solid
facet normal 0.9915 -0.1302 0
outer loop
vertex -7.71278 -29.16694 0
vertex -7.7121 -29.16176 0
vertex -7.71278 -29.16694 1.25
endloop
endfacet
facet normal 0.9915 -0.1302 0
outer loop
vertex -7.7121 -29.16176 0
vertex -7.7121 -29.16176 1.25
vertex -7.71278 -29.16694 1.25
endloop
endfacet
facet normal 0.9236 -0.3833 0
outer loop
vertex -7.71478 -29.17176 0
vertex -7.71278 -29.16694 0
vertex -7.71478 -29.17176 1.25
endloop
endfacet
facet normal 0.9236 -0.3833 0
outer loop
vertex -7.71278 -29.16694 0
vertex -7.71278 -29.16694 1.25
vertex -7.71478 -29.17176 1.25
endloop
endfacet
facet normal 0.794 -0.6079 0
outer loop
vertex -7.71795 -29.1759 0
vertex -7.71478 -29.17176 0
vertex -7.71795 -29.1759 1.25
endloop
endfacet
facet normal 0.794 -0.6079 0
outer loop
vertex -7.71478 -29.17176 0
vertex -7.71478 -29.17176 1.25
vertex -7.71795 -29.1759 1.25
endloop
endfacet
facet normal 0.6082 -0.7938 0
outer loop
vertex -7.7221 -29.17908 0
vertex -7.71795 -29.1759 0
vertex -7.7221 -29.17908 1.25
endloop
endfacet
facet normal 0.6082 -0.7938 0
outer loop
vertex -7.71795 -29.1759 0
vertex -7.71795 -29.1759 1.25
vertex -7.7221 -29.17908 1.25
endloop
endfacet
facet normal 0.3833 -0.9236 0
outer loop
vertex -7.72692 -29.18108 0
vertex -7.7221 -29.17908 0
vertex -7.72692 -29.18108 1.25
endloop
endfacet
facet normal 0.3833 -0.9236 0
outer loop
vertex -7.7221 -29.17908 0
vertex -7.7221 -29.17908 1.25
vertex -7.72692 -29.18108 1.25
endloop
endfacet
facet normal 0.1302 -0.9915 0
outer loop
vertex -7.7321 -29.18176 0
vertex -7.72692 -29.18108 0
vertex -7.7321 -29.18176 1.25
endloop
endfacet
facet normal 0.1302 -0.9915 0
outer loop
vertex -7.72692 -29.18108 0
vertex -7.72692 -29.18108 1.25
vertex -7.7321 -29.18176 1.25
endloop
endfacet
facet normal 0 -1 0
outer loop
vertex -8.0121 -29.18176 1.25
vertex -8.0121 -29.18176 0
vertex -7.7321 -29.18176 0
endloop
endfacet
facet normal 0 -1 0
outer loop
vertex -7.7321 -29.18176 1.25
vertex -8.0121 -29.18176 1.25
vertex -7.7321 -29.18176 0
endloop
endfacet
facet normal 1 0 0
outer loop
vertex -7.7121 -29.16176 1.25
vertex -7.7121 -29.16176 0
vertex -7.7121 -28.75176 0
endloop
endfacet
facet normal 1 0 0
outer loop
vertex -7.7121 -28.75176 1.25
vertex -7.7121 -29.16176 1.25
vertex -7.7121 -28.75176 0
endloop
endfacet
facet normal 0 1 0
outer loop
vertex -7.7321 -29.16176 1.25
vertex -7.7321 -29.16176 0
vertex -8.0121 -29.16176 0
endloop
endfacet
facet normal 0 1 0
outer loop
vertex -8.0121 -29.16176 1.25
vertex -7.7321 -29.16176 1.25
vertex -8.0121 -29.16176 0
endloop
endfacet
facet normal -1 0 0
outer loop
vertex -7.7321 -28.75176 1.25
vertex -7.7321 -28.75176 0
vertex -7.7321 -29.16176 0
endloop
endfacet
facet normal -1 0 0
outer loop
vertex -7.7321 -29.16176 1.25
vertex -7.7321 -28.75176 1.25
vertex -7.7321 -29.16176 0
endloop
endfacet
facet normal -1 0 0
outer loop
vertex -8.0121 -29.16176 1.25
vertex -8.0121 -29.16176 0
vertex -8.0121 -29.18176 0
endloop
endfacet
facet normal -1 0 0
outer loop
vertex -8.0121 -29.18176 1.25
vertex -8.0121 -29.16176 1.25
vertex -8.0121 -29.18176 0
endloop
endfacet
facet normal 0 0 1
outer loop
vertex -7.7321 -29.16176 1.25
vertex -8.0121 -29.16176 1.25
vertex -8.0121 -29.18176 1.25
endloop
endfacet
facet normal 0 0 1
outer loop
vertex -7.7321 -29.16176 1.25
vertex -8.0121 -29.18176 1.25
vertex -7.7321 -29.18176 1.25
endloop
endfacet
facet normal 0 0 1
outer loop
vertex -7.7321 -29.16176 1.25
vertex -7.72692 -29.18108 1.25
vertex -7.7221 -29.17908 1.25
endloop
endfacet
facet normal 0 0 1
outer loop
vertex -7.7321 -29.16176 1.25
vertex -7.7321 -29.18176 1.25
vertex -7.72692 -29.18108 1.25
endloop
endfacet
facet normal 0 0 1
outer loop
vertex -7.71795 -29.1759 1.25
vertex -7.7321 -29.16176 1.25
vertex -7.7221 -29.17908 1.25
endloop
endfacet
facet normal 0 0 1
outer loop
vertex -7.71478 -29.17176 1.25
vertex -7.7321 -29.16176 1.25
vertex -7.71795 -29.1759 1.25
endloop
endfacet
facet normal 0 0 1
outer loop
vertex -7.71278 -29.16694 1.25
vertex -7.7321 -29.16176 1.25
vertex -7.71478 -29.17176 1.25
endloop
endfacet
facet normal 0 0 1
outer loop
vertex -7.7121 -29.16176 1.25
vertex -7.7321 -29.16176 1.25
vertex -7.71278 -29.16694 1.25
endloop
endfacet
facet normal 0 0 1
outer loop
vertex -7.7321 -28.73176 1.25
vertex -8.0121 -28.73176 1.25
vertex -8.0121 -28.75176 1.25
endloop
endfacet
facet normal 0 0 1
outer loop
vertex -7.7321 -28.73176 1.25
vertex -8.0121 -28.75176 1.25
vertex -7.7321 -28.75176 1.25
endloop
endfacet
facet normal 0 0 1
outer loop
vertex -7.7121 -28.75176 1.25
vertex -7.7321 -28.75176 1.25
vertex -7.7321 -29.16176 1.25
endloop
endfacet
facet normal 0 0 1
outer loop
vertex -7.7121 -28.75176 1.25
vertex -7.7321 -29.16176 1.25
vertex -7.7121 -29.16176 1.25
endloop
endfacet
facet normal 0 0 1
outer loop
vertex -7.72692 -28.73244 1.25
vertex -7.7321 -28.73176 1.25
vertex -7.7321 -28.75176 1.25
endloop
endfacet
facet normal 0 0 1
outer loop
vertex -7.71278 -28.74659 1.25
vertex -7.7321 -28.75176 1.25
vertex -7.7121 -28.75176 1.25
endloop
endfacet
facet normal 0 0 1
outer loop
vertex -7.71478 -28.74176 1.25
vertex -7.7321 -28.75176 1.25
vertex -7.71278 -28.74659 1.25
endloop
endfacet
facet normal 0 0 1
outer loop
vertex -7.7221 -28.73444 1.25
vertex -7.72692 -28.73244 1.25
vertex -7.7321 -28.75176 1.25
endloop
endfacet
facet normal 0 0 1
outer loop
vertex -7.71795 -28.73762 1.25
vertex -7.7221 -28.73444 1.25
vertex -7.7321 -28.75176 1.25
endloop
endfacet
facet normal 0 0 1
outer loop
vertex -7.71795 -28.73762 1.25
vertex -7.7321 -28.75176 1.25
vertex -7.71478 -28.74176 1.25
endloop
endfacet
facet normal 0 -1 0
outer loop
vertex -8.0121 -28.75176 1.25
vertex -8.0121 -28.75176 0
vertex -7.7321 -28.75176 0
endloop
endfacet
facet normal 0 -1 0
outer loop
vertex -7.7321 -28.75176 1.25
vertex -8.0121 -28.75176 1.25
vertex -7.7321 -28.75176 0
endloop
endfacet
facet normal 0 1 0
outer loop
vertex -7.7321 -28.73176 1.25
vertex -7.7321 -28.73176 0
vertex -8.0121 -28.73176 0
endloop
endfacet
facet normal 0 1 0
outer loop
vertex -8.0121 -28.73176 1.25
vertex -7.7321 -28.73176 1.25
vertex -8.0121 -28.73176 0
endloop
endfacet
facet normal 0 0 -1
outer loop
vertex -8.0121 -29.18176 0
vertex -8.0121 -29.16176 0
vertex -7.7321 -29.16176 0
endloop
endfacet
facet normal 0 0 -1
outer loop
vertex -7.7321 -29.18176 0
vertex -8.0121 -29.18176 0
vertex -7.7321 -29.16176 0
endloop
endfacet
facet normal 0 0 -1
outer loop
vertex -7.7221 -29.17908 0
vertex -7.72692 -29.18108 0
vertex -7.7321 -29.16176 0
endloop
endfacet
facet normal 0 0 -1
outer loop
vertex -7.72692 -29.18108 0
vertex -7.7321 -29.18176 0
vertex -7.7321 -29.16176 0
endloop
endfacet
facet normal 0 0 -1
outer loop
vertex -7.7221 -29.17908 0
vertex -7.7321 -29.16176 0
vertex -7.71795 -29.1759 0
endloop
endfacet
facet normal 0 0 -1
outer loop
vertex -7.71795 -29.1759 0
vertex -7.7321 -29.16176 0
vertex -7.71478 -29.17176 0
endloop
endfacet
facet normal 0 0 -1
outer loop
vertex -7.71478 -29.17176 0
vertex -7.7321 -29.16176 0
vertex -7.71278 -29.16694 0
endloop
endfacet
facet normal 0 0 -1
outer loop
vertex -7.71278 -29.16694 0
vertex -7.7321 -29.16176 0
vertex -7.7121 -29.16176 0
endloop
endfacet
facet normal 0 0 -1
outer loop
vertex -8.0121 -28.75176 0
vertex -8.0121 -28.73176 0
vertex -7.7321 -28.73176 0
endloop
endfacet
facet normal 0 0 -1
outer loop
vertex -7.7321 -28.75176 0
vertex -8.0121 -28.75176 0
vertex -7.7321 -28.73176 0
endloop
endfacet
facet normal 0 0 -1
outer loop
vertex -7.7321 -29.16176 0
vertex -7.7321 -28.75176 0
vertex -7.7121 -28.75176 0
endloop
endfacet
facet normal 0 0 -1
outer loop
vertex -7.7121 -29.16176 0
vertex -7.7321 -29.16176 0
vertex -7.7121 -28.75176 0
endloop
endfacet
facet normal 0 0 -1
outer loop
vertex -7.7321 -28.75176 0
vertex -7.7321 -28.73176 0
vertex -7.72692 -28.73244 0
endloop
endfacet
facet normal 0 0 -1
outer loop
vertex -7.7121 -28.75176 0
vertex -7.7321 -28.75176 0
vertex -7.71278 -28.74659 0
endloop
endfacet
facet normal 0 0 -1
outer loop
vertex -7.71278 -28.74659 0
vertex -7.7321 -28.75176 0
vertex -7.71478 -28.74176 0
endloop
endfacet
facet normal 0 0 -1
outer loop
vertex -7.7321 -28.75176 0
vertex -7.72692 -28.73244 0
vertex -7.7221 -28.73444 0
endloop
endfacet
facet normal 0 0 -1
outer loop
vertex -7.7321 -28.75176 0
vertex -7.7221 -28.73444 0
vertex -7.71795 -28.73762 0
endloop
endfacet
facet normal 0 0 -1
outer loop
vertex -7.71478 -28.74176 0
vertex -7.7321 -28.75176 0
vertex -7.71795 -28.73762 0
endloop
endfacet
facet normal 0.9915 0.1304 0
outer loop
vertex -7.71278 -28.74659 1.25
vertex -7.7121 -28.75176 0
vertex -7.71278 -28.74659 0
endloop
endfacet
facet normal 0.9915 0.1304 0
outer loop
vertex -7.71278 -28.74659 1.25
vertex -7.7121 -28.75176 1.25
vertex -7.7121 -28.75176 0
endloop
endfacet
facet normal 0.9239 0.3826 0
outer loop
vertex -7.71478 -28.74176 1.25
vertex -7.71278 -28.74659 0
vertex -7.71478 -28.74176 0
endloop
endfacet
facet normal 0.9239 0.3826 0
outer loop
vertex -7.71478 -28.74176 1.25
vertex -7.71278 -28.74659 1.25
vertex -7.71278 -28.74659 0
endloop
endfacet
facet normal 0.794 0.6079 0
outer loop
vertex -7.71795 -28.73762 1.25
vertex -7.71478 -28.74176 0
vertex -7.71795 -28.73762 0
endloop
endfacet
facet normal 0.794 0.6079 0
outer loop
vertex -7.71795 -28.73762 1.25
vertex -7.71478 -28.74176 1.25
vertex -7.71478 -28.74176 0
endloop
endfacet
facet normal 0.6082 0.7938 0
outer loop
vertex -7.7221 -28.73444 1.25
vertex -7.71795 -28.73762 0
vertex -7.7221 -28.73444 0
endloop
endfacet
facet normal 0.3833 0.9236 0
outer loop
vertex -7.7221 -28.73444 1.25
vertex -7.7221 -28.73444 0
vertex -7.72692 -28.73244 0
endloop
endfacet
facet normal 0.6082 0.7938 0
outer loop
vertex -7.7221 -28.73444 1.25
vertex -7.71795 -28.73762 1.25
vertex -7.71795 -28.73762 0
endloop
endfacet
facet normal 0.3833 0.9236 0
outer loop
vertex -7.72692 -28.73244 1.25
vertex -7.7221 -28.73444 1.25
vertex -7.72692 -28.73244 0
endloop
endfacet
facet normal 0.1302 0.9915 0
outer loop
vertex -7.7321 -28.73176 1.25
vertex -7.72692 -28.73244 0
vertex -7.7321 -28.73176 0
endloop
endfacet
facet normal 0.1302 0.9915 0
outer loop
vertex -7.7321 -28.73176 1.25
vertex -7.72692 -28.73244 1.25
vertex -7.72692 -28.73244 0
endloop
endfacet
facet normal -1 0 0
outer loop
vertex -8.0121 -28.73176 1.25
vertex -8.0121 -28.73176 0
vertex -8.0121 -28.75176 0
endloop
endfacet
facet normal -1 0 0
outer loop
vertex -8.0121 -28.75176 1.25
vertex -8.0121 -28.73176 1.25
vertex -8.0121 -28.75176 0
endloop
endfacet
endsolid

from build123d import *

# Parameters (mm, degrees)
RESSALTO_EXTRUS_O1_DEPTH = 1.25
FILETE1_R                = 0.02
FILETE2_R                = 0.02


with BuildPart() as part:
    # Esboço1 → Ressalto-extrusão1 (new body)
    with BuildSketch(Plane.XY):
        Polygon((-8.012095627, -28.751761562), (-7.732095627, -28.751761562), (-7.732095627, -29.161761562), (-8.012095627, -29.161761562), (-8.012095627, -29.181761562), (-7.712095627, -29.181761562), (-7.712095627, -28.731761562), (-8.012095627, -28.731761562), align=None)
    extrude(amount=RESSALTO_EXTRUS_O1_DEPTH)

    # Filete1
    filete1_edges = [part.edges().sort_by_distance(p)[0] for p in [
        (-7.712095627, -28.731761562, 0.625),
    ]]
    fillet(filete1_edges, radius=FILETE1_R)

    # Filete2
    filete2_edges = [part.edges().sort_by_distance(p)[0] for p in [
        (-7.712095627, -29.181761562, 0.625),
    ]]
    fillet(filete2_edges, radius=FILETE2_R)


solid = part.part
